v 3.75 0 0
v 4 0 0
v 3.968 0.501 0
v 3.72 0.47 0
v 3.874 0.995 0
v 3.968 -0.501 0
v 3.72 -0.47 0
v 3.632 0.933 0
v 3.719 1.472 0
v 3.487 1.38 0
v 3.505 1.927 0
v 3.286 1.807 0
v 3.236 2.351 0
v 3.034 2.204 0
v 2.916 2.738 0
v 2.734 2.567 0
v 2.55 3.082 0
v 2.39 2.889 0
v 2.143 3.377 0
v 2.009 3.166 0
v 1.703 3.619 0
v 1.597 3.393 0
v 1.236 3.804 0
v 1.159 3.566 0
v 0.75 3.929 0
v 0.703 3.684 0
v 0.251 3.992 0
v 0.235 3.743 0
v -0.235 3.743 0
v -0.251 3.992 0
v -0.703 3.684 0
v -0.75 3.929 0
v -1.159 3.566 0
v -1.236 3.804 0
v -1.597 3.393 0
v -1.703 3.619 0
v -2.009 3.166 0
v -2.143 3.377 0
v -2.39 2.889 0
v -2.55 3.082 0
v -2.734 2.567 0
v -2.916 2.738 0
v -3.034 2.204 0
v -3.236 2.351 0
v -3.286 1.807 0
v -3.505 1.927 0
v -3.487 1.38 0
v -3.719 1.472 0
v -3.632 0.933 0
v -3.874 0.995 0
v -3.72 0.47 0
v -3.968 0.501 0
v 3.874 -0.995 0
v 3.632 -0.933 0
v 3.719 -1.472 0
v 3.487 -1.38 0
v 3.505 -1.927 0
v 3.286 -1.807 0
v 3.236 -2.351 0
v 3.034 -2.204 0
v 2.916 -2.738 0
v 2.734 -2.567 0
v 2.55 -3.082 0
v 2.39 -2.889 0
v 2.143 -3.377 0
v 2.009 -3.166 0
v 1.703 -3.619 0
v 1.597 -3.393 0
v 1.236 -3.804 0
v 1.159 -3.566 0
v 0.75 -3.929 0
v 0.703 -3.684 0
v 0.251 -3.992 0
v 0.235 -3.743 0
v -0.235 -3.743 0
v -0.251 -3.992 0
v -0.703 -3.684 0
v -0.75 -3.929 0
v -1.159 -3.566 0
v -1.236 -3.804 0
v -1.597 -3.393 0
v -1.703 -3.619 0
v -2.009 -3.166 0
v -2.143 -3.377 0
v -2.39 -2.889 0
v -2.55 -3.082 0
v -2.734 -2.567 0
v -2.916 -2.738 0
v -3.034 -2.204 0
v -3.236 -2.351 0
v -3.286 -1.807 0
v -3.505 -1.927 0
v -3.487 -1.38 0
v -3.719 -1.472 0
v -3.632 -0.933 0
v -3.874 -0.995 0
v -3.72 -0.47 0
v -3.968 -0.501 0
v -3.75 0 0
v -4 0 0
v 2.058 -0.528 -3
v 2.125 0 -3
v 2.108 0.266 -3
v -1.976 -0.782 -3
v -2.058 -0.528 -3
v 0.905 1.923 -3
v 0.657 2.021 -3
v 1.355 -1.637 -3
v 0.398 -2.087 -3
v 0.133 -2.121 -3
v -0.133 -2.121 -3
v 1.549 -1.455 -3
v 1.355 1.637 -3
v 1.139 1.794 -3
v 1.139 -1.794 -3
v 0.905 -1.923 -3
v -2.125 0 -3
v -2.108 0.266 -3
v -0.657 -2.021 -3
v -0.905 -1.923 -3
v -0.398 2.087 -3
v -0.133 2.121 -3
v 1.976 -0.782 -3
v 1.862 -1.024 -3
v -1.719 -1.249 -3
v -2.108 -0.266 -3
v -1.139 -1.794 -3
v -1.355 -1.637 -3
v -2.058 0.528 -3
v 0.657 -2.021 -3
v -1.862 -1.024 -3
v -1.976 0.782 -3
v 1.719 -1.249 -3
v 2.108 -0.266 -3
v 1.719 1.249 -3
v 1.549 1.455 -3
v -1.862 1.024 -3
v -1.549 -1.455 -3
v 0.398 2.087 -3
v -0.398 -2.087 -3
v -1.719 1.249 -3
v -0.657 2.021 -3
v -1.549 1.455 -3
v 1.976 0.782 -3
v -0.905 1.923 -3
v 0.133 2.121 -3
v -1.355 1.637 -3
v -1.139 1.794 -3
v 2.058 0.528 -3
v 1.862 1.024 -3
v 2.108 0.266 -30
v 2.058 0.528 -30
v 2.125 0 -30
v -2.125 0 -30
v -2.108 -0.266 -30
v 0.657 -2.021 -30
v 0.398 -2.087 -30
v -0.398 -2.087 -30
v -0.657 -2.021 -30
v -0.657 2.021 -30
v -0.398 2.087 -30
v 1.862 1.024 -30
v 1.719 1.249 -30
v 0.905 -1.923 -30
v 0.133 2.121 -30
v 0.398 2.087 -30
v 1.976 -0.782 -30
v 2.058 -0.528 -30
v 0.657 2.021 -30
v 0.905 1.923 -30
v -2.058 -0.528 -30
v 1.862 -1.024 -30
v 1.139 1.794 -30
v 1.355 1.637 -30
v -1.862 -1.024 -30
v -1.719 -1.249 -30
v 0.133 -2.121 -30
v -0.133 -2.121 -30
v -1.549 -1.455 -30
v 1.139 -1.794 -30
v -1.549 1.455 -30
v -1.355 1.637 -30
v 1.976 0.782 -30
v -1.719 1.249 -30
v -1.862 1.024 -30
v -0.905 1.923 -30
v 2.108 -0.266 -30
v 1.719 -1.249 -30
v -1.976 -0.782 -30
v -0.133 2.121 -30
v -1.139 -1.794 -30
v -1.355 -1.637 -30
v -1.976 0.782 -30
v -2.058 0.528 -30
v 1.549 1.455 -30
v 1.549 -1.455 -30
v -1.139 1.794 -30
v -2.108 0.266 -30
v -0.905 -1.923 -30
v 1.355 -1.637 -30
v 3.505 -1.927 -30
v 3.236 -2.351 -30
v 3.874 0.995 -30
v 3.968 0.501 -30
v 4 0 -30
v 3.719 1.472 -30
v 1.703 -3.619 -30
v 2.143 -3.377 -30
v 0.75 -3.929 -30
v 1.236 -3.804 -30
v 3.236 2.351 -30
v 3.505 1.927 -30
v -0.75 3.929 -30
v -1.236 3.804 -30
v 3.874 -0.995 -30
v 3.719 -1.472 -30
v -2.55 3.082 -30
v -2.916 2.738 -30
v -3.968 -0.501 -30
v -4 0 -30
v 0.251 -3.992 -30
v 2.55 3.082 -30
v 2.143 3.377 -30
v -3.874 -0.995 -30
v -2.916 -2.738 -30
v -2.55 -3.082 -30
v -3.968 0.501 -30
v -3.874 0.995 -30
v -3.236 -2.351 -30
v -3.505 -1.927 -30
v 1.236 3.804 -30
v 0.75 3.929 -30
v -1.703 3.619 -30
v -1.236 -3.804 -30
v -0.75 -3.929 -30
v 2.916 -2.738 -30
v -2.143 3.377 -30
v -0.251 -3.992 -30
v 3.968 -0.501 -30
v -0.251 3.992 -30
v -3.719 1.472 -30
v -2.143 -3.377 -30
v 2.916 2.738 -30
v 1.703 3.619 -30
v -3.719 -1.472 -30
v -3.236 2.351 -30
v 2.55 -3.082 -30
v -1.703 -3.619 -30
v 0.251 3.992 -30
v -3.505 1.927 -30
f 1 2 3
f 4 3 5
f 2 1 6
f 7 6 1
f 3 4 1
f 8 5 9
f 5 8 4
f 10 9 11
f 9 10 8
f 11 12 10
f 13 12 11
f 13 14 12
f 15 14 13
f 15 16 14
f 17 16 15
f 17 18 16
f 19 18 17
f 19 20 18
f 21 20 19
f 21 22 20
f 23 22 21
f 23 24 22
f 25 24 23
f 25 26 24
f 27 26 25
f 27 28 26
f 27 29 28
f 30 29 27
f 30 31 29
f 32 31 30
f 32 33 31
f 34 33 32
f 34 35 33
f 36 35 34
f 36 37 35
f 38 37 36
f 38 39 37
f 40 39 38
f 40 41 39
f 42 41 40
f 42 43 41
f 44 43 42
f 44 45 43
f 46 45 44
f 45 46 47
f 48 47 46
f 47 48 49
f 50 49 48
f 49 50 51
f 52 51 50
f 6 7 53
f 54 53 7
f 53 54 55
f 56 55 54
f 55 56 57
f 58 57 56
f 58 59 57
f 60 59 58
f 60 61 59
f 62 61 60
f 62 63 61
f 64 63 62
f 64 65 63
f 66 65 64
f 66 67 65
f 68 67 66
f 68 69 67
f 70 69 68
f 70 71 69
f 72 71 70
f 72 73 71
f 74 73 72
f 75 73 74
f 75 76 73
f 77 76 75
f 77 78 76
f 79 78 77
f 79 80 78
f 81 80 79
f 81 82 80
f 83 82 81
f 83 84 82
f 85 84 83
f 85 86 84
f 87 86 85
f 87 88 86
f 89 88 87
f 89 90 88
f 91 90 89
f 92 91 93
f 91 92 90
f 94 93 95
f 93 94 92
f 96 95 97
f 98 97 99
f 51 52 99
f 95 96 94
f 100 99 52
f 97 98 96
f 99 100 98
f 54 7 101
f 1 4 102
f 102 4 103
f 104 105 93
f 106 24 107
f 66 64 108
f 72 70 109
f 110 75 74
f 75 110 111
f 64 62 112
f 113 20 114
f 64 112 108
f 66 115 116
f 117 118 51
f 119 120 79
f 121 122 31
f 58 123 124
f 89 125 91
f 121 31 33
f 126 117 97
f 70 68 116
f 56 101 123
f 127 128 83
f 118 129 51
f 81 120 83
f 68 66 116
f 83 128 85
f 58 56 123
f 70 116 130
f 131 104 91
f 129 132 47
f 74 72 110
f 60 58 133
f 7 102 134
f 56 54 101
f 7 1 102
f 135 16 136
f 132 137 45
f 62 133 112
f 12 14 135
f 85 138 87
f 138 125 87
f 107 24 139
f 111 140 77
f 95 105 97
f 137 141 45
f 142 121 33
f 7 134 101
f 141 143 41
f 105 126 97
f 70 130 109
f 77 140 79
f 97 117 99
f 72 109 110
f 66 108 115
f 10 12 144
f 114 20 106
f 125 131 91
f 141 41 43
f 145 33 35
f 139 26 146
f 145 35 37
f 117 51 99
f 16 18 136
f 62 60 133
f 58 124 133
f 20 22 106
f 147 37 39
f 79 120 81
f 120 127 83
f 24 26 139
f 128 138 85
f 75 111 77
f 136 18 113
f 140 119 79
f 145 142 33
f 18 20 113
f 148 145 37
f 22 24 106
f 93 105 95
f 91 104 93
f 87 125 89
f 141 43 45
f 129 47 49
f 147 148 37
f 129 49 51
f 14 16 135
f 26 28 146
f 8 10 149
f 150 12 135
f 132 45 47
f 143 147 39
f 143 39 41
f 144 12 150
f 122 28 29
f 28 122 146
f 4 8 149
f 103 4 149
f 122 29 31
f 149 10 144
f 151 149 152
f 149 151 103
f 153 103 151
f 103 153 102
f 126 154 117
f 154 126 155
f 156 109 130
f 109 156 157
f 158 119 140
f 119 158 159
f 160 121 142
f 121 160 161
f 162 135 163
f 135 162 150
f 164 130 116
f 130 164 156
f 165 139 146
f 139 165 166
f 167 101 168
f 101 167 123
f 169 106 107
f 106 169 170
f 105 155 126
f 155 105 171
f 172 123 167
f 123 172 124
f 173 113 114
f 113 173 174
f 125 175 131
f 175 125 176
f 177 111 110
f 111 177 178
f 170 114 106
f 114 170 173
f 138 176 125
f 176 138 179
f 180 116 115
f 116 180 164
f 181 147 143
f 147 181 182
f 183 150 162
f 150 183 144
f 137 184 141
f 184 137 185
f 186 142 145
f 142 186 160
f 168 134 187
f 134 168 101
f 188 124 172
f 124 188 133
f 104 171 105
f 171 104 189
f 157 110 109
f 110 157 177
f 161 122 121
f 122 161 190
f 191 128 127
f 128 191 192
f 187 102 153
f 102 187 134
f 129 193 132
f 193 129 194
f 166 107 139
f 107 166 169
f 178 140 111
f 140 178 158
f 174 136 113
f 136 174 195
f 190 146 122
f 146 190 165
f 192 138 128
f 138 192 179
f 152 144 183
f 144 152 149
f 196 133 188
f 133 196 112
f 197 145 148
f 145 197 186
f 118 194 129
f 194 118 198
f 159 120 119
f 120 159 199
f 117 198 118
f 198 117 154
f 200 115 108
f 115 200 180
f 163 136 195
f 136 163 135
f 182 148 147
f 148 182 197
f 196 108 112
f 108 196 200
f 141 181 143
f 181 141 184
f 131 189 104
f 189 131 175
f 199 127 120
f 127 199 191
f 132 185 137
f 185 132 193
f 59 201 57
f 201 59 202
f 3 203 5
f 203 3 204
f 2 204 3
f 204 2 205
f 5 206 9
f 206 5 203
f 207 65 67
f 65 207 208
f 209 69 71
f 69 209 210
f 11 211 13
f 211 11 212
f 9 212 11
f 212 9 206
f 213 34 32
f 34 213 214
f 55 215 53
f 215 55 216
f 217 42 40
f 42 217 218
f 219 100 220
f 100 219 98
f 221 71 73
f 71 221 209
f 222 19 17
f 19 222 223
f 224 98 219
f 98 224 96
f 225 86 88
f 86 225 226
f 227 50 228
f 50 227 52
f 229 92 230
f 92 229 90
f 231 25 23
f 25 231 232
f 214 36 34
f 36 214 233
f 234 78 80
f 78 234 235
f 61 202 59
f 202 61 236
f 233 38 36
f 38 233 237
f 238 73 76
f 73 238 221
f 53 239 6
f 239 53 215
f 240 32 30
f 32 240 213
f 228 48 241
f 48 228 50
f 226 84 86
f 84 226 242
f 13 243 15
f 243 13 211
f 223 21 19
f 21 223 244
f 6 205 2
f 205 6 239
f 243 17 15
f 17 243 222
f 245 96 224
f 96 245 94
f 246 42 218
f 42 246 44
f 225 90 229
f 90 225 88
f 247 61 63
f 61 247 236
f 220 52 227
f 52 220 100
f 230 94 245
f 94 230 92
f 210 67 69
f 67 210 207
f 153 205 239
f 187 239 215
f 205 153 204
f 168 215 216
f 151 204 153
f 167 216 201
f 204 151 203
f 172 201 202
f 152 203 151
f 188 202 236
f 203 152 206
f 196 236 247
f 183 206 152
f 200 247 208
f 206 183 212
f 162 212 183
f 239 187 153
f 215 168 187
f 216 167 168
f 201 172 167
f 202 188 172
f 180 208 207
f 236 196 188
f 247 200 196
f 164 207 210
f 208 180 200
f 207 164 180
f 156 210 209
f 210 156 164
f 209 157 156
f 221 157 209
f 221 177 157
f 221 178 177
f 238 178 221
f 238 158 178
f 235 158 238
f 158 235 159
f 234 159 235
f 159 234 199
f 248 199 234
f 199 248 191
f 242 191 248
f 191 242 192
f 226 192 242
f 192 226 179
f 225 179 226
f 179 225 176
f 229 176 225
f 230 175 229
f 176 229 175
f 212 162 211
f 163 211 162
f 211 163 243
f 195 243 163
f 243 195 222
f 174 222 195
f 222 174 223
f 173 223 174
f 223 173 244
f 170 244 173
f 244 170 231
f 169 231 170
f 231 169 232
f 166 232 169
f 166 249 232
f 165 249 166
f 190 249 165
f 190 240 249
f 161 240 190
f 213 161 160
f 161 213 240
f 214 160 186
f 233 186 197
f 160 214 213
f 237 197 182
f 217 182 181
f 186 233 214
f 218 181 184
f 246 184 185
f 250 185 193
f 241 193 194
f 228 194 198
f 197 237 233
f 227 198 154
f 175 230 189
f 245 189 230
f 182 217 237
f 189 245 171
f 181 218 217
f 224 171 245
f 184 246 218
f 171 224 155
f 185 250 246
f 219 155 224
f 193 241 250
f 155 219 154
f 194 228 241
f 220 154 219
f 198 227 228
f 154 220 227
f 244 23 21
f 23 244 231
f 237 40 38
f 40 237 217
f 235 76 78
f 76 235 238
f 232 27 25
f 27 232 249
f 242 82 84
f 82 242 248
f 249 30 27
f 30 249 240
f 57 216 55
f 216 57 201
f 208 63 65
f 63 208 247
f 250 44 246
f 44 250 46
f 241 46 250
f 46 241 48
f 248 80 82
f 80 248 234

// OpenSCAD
$fn = 50;

difference() {
	union() {
		translate(v = [0, 0, -30.0]) {
			cylinder(h = 33, r = 4.0);
		}
	}
	union() {
		translate(v = [0, 0, 0]) {
			rotate(a = [0, 0, 0]) {
				difference() {
					union() {
						translate(v = [0, 0, -33.0]) {
							cylinder(h = 33, r = 2.0);
						}
						translate(v = [0, 0, -3]) {
							cylinder(h = 3, r1 = 2.125, r2 = 3.75);
						}
						translate(v = [0, 0, -33.0]) {
							cylinder(h = 33, r = 2.125);
						}
						translate(v = [0, 0, -33.0]) {
							cylinder(h = 33, r = 2.0);
						}
					}
					union();
				}
			}
		}
		#cylinder(h = 3, r = 5.0);
	}
}
